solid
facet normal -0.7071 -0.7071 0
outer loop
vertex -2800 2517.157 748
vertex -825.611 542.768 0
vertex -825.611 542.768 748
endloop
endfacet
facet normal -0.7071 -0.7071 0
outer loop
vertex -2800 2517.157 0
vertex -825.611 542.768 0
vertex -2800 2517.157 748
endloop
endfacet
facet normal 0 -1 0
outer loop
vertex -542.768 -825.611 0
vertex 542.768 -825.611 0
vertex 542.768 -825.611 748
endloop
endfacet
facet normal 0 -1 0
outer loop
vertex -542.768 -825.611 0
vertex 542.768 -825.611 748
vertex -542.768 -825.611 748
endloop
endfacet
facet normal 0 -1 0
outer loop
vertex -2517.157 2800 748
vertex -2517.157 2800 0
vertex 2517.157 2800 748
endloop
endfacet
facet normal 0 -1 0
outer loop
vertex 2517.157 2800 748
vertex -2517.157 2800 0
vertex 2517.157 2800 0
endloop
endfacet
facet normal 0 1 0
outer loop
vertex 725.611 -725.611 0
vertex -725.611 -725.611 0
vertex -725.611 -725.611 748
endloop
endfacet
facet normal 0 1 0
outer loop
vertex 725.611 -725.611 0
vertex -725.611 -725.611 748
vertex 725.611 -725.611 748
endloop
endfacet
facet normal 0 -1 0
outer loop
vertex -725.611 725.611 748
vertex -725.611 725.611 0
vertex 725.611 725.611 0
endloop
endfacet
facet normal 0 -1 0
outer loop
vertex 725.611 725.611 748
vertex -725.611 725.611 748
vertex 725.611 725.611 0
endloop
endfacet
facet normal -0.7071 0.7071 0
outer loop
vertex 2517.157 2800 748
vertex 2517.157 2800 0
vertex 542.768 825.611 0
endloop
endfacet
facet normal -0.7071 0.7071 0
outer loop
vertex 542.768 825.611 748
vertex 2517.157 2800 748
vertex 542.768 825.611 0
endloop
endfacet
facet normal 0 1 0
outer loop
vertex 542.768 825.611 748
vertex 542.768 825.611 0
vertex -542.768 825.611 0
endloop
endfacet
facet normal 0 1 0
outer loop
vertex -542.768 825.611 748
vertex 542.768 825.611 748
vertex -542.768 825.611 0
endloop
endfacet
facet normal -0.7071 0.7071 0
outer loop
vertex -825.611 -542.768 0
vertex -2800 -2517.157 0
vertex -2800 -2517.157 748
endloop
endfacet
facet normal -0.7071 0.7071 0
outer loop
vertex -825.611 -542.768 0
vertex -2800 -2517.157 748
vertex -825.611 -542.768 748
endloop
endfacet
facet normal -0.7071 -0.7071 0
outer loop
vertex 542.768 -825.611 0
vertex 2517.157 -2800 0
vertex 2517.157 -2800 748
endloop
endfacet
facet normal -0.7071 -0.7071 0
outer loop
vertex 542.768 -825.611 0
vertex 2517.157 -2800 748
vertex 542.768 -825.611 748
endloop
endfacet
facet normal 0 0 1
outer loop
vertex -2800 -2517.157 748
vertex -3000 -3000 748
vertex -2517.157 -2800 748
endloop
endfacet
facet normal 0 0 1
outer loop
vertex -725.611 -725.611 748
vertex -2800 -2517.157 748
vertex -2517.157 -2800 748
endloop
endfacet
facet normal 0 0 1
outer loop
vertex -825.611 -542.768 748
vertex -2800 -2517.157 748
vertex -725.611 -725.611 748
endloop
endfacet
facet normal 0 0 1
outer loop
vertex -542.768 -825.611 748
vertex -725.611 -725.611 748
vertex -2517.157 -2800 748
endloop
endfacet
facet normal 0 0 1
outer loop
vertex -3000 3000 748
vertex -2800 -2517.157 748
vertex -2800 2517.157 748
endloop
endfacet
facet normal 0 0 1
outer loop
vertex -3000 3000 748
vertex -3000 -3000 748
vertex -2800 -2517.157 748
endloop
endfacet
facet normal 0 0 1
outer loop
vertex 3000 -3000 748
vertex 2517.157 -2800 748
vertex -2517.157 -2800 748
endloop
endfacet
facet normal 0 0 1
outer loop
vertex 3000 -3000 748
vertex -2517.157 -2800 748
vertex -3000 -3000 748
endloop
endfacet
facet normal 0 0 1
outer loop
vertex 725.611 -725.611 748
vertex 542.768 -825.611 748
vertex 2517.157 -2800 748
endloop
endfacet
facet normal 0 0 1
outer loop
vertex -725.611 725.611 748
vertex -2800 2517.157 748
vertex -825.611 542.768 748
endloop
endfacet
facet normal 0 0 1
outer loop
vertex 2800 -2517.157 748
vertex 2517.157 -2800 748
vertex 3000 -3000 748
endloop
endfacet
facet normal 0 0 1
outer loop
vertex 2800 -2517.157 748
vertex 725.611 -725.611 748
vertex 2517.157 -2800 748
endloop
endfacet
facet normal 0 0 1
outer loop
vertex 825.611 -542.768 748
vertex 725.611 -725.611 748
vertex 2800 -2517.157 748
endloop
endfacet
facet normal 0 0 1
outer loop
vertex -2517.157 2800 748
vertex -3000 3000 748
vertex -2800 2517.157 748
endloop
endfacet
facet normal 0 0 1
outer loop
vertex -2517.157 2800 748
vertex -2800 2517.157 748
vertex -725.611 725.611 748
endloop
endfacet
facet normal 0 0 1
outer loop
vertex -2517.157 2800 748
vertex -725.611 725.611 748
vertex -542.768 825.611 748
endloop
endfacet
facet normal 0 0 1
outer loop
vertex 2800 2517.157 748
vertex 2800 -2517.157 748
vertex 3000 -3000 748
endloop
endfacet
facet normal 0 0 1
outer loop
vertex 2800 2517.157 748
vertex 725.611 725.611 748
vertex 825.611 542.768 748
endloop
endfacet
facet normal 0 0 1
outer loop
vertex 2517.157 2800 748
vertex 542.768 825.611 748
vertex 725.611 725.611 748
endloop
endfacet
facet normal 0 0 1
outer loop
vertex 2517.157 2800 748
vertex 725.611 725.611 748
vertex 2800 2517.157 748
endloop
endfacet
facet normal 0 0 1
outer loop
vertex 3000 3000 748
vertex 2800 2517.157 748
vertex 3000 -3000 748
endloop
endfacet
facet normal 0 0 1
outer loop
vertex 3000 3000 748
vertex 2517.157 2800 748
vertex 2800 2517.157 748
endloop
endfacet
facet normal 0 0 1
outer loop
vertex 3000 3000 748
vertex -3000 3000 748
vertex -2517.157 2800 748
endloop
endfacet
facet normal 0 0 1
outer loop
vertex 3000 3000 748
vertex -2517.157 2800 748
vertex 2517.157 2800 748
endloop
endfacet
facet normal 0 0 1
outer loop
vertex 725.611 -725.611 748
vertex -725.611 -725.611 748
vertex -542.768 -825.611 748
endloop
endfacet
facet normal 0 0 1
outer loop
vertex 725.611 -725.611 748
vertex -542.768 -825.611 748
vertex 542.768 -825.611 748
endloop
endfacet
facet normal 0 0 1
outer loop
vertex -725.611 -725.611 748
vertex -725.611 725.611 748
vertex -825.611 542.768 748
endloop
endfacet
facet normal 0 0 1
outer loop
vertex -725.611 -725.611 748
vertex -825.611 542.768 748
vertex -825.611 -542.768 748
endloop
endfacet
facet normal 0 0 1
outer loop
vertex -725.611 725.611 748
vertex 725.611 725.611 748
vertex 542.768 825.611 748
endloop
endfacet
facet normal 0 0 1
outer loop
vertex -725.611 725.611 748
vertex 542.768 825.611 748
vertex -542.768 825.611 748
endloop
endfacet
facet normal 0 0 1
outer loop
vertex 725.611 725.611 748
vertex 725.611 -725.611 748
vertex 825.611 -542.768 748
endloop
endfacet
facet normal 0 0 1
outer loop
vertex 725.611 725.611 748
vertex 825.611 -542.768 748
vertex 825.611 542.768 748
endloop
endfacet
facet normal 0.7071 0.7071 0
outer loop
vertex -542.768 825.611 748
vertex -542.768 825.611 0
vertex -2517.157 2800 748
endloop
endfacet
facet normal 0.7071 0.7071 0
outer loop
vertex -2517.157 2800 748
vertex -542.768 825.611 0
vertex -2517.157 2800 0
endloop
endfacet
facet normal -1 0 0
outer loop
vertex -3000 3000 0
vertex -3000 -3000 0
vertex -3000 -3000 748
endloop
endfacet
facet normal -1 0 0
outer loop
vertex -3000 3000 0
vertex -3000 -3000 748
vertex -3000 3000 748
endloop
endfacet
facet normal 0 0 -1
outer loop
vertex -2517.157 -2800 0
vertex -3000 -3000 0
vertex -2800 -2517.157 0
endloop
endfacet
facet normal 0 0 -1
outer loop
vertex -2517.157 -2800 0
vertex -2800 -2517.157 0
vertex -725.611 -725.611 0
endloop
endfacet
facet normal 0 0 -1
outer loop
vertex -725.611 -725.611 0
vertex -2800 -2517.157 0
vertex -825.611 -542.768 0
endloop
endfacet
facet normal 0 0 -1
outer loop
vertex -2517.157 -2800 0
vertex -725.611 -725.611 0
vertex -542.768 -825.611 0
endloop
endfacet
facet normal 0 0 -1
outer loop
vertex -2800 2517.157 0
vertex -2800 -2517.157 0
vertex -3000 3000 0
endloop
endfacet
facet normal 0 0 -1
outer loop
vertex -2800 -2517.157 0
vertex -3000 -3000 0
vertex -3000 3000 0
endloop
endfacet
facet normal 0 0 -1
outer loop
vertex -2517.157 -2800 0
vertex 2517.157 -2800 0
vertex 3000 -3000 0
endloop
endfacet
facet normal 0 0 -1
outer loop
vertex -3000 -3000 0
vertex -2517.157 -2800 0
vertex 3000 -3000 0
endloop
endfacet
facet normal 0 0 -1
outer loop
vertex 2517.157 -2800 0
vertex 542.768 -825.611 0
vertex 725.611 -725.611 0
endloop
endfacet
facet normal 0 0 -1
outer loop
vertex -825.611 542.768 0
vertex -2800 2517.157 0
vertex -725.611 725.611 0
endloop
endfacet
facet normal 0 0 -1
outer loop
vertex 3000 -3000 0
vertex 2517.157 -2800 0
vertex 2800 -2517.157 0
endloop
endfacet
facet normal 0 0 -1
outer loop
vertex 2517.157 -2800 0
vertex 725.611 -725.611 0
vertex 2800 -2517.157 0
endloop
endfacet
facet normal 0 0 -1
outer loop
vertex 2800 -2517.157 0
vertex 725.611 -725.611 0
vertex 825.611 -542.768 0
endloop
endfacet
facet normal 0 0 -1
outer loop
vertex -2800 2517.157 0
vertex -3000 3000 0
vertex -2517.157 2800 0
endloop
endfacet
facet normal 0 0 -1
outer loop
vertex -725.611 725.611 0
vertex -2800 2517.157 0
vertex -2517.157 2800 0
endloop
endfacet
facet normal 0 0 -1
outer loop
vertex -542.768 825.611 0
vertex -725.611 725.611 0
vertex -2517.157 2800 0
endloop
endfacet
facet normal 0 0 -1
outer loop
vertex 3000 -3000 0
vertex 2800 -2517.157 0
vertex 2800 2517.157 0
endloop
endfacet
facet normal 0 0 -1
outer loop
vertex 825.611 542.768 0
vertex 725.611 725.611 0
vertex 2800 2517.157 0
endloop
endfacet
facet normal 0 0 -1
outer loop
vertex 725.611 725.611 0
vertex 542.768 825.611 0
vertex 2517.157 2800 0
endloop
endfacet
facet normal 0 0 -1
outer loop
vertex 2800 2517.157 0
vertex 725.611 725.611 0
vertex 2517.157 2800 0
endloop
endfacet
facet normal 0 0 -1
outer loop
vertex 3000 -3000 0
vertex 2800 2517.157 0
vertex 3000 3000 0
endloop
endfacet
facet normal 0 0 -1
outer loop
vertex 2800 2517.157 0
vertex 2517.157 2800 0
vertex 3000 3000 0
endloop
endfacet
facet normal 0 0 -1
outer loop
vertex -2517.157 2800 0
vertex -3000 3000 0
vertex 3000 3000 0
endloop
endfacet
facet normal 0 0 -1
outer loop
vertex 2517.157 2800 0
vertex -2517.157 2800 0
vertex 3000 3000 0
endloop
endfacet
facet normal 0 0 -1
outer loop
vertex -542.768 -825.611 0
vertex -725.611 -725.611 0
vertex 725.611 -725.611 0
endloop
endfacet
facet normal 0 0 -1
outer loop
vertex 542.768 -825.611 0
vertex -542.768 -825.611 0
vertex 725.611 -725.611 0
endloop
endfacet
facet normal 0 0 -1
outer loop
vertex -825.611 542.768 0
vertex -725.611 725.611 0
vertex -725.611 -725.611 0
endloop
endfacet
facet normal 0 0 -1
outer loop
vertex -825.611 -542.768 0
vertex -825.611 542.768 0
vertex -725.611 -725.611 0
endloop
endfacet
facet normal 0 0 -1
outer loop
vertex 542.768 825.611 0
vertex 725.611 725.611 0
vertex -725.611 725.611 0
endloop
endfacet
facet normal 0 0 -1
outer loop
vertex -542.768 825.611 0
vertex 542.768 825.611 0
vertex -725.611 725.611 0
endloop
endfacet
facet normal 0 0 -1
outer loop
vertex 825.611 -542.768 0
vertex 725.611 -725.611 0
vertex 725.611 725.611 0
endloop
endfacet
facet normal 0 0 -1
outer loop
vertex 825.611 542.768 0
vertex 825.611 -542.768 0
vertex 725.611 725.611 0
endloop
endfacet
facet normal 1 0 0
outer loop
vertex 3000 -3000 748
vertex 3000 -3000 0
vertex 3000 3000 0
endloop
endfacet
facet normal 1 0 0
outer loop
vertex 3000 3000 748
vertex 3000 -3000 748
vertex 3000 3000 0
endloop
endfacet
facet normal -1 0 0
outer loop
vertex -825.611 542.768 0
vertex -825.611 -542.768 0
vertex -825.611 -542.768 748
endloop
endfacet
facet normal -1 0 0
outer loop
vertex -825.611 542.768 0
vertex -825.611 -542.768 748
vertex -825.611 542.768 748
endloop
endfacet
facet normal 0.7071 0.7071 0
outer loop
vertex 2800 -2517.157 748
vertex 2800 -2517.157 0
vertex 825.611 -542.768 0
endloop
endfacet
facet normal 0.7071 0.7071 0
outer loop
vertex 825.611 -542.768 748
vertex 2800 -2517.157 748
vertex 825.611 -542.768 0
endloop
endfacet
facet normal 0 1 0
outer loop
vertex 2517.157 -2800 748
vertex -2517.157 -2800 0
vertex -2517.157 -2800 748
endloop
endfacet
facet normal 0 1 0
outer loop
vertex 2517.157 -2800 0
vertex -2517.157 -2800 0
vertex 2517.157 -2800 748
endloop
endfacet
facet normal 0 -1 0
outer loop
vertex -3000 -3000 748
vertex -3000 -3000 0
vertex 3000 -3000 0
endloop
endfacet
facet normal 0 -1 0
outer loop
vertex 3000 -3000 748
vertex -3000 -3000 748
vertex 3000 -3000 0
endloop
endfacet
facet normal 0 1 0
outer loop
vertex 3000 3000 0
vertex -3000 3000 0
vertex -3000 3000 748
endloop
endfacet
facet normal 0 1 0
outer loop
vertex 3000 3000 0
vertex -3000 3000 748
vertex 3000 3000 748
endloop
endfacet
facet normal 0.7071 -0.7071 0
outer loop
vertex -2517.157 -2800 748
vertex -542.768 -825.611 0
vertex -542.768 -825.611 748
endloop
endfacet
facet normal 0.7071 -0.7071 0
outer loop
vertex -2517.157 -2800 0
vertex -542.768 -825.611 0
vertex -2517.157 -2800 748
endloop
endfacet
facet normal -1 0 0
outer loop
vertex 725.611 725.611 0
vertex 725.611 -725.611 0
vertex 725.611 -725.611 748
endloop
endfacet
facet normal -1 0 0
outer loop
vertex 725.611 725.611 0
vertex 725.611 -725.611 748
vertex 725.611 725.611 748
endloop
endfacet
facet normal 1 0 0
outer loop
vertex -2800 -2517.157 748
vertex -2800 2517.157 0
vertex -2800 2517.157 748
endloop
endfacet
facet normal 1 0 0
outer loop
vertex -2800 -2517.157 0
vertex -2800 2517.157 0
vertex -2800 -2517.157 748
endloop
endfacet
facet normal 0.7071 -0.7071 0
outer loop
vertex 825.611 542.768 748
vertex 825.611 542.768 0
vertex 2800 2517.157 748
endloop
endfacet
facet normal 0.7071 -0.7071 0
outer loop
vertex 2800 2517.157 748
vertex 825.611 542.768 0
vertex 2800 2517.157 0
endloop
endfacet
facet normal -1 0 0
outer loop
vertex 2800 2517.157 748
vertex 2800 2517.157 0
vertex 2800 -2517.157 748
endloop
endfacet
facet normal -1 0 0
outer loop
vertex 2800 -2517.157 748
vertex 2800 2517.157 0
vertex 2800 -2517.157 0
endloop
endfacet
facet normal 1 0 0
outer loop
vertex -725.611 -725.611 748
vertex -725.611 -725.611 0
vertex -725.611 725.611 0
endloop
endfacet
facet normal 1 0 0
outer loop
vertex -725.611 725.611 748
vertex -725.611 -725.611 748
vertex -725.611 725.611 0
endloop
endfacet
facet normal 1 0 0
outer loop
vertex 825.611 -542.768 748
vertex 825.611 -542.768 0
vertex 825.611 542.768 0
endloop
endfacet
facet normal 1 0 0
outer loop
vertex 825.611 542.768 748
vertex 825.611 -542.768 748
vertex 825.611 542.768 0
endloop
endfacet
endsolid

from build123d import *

# Parameters (mm, degrees)
SKETCH1_W           = 6000
SKETCH1_H           = 6000
SKETCH1_W_2         = 1451.222297848
SKETCH1_H_2         = 1451.222297848
BOSS_EXTRUDE1_DEPTH = 748


with BuildPart() as part:
    # Sketch1 → Boss-Extrude1 (new body)
    with BuildSketch(Plane.XY):
        Rectangle(SKETCH1_W, SKETCH1_H)
        Polygon((-2517.157287525, 2800), (2517.157287525, 2800), (542.768436449, 825.611148924), (-542.768436449, 825.611148924), align=None, mode=Mode.SUBTRACT)
        Polygon((2800, 2517.157287525), (2800, -2517.157287525), (825.611148924, -542.768436449), (825.611148924, 542.768436449), align=None, mode=Mode.SUBTRACT)
        Polygon((-2517.157287525, -2800), (2517.157287525, -2800), (542.768436449, -825.611148924), (-542.768436449, -825.611148924), align=None, mode=Mode.SUBTRACT)
        Polygon((-2800, 2517.157287525), (-2800, -2517.157287525), (-825.611148924, -542.768436449), (-825.611148924, 542.768436449), align=None, mode=Mode.SUBTRACT)
        Rectangle(SKETCH1_W_2, SKETCH1_H_2, mode=Mode.SUBTRACT)
    extrude(amount=BOSS_EXTRUDE1_DEPTH)


solid = part.part
